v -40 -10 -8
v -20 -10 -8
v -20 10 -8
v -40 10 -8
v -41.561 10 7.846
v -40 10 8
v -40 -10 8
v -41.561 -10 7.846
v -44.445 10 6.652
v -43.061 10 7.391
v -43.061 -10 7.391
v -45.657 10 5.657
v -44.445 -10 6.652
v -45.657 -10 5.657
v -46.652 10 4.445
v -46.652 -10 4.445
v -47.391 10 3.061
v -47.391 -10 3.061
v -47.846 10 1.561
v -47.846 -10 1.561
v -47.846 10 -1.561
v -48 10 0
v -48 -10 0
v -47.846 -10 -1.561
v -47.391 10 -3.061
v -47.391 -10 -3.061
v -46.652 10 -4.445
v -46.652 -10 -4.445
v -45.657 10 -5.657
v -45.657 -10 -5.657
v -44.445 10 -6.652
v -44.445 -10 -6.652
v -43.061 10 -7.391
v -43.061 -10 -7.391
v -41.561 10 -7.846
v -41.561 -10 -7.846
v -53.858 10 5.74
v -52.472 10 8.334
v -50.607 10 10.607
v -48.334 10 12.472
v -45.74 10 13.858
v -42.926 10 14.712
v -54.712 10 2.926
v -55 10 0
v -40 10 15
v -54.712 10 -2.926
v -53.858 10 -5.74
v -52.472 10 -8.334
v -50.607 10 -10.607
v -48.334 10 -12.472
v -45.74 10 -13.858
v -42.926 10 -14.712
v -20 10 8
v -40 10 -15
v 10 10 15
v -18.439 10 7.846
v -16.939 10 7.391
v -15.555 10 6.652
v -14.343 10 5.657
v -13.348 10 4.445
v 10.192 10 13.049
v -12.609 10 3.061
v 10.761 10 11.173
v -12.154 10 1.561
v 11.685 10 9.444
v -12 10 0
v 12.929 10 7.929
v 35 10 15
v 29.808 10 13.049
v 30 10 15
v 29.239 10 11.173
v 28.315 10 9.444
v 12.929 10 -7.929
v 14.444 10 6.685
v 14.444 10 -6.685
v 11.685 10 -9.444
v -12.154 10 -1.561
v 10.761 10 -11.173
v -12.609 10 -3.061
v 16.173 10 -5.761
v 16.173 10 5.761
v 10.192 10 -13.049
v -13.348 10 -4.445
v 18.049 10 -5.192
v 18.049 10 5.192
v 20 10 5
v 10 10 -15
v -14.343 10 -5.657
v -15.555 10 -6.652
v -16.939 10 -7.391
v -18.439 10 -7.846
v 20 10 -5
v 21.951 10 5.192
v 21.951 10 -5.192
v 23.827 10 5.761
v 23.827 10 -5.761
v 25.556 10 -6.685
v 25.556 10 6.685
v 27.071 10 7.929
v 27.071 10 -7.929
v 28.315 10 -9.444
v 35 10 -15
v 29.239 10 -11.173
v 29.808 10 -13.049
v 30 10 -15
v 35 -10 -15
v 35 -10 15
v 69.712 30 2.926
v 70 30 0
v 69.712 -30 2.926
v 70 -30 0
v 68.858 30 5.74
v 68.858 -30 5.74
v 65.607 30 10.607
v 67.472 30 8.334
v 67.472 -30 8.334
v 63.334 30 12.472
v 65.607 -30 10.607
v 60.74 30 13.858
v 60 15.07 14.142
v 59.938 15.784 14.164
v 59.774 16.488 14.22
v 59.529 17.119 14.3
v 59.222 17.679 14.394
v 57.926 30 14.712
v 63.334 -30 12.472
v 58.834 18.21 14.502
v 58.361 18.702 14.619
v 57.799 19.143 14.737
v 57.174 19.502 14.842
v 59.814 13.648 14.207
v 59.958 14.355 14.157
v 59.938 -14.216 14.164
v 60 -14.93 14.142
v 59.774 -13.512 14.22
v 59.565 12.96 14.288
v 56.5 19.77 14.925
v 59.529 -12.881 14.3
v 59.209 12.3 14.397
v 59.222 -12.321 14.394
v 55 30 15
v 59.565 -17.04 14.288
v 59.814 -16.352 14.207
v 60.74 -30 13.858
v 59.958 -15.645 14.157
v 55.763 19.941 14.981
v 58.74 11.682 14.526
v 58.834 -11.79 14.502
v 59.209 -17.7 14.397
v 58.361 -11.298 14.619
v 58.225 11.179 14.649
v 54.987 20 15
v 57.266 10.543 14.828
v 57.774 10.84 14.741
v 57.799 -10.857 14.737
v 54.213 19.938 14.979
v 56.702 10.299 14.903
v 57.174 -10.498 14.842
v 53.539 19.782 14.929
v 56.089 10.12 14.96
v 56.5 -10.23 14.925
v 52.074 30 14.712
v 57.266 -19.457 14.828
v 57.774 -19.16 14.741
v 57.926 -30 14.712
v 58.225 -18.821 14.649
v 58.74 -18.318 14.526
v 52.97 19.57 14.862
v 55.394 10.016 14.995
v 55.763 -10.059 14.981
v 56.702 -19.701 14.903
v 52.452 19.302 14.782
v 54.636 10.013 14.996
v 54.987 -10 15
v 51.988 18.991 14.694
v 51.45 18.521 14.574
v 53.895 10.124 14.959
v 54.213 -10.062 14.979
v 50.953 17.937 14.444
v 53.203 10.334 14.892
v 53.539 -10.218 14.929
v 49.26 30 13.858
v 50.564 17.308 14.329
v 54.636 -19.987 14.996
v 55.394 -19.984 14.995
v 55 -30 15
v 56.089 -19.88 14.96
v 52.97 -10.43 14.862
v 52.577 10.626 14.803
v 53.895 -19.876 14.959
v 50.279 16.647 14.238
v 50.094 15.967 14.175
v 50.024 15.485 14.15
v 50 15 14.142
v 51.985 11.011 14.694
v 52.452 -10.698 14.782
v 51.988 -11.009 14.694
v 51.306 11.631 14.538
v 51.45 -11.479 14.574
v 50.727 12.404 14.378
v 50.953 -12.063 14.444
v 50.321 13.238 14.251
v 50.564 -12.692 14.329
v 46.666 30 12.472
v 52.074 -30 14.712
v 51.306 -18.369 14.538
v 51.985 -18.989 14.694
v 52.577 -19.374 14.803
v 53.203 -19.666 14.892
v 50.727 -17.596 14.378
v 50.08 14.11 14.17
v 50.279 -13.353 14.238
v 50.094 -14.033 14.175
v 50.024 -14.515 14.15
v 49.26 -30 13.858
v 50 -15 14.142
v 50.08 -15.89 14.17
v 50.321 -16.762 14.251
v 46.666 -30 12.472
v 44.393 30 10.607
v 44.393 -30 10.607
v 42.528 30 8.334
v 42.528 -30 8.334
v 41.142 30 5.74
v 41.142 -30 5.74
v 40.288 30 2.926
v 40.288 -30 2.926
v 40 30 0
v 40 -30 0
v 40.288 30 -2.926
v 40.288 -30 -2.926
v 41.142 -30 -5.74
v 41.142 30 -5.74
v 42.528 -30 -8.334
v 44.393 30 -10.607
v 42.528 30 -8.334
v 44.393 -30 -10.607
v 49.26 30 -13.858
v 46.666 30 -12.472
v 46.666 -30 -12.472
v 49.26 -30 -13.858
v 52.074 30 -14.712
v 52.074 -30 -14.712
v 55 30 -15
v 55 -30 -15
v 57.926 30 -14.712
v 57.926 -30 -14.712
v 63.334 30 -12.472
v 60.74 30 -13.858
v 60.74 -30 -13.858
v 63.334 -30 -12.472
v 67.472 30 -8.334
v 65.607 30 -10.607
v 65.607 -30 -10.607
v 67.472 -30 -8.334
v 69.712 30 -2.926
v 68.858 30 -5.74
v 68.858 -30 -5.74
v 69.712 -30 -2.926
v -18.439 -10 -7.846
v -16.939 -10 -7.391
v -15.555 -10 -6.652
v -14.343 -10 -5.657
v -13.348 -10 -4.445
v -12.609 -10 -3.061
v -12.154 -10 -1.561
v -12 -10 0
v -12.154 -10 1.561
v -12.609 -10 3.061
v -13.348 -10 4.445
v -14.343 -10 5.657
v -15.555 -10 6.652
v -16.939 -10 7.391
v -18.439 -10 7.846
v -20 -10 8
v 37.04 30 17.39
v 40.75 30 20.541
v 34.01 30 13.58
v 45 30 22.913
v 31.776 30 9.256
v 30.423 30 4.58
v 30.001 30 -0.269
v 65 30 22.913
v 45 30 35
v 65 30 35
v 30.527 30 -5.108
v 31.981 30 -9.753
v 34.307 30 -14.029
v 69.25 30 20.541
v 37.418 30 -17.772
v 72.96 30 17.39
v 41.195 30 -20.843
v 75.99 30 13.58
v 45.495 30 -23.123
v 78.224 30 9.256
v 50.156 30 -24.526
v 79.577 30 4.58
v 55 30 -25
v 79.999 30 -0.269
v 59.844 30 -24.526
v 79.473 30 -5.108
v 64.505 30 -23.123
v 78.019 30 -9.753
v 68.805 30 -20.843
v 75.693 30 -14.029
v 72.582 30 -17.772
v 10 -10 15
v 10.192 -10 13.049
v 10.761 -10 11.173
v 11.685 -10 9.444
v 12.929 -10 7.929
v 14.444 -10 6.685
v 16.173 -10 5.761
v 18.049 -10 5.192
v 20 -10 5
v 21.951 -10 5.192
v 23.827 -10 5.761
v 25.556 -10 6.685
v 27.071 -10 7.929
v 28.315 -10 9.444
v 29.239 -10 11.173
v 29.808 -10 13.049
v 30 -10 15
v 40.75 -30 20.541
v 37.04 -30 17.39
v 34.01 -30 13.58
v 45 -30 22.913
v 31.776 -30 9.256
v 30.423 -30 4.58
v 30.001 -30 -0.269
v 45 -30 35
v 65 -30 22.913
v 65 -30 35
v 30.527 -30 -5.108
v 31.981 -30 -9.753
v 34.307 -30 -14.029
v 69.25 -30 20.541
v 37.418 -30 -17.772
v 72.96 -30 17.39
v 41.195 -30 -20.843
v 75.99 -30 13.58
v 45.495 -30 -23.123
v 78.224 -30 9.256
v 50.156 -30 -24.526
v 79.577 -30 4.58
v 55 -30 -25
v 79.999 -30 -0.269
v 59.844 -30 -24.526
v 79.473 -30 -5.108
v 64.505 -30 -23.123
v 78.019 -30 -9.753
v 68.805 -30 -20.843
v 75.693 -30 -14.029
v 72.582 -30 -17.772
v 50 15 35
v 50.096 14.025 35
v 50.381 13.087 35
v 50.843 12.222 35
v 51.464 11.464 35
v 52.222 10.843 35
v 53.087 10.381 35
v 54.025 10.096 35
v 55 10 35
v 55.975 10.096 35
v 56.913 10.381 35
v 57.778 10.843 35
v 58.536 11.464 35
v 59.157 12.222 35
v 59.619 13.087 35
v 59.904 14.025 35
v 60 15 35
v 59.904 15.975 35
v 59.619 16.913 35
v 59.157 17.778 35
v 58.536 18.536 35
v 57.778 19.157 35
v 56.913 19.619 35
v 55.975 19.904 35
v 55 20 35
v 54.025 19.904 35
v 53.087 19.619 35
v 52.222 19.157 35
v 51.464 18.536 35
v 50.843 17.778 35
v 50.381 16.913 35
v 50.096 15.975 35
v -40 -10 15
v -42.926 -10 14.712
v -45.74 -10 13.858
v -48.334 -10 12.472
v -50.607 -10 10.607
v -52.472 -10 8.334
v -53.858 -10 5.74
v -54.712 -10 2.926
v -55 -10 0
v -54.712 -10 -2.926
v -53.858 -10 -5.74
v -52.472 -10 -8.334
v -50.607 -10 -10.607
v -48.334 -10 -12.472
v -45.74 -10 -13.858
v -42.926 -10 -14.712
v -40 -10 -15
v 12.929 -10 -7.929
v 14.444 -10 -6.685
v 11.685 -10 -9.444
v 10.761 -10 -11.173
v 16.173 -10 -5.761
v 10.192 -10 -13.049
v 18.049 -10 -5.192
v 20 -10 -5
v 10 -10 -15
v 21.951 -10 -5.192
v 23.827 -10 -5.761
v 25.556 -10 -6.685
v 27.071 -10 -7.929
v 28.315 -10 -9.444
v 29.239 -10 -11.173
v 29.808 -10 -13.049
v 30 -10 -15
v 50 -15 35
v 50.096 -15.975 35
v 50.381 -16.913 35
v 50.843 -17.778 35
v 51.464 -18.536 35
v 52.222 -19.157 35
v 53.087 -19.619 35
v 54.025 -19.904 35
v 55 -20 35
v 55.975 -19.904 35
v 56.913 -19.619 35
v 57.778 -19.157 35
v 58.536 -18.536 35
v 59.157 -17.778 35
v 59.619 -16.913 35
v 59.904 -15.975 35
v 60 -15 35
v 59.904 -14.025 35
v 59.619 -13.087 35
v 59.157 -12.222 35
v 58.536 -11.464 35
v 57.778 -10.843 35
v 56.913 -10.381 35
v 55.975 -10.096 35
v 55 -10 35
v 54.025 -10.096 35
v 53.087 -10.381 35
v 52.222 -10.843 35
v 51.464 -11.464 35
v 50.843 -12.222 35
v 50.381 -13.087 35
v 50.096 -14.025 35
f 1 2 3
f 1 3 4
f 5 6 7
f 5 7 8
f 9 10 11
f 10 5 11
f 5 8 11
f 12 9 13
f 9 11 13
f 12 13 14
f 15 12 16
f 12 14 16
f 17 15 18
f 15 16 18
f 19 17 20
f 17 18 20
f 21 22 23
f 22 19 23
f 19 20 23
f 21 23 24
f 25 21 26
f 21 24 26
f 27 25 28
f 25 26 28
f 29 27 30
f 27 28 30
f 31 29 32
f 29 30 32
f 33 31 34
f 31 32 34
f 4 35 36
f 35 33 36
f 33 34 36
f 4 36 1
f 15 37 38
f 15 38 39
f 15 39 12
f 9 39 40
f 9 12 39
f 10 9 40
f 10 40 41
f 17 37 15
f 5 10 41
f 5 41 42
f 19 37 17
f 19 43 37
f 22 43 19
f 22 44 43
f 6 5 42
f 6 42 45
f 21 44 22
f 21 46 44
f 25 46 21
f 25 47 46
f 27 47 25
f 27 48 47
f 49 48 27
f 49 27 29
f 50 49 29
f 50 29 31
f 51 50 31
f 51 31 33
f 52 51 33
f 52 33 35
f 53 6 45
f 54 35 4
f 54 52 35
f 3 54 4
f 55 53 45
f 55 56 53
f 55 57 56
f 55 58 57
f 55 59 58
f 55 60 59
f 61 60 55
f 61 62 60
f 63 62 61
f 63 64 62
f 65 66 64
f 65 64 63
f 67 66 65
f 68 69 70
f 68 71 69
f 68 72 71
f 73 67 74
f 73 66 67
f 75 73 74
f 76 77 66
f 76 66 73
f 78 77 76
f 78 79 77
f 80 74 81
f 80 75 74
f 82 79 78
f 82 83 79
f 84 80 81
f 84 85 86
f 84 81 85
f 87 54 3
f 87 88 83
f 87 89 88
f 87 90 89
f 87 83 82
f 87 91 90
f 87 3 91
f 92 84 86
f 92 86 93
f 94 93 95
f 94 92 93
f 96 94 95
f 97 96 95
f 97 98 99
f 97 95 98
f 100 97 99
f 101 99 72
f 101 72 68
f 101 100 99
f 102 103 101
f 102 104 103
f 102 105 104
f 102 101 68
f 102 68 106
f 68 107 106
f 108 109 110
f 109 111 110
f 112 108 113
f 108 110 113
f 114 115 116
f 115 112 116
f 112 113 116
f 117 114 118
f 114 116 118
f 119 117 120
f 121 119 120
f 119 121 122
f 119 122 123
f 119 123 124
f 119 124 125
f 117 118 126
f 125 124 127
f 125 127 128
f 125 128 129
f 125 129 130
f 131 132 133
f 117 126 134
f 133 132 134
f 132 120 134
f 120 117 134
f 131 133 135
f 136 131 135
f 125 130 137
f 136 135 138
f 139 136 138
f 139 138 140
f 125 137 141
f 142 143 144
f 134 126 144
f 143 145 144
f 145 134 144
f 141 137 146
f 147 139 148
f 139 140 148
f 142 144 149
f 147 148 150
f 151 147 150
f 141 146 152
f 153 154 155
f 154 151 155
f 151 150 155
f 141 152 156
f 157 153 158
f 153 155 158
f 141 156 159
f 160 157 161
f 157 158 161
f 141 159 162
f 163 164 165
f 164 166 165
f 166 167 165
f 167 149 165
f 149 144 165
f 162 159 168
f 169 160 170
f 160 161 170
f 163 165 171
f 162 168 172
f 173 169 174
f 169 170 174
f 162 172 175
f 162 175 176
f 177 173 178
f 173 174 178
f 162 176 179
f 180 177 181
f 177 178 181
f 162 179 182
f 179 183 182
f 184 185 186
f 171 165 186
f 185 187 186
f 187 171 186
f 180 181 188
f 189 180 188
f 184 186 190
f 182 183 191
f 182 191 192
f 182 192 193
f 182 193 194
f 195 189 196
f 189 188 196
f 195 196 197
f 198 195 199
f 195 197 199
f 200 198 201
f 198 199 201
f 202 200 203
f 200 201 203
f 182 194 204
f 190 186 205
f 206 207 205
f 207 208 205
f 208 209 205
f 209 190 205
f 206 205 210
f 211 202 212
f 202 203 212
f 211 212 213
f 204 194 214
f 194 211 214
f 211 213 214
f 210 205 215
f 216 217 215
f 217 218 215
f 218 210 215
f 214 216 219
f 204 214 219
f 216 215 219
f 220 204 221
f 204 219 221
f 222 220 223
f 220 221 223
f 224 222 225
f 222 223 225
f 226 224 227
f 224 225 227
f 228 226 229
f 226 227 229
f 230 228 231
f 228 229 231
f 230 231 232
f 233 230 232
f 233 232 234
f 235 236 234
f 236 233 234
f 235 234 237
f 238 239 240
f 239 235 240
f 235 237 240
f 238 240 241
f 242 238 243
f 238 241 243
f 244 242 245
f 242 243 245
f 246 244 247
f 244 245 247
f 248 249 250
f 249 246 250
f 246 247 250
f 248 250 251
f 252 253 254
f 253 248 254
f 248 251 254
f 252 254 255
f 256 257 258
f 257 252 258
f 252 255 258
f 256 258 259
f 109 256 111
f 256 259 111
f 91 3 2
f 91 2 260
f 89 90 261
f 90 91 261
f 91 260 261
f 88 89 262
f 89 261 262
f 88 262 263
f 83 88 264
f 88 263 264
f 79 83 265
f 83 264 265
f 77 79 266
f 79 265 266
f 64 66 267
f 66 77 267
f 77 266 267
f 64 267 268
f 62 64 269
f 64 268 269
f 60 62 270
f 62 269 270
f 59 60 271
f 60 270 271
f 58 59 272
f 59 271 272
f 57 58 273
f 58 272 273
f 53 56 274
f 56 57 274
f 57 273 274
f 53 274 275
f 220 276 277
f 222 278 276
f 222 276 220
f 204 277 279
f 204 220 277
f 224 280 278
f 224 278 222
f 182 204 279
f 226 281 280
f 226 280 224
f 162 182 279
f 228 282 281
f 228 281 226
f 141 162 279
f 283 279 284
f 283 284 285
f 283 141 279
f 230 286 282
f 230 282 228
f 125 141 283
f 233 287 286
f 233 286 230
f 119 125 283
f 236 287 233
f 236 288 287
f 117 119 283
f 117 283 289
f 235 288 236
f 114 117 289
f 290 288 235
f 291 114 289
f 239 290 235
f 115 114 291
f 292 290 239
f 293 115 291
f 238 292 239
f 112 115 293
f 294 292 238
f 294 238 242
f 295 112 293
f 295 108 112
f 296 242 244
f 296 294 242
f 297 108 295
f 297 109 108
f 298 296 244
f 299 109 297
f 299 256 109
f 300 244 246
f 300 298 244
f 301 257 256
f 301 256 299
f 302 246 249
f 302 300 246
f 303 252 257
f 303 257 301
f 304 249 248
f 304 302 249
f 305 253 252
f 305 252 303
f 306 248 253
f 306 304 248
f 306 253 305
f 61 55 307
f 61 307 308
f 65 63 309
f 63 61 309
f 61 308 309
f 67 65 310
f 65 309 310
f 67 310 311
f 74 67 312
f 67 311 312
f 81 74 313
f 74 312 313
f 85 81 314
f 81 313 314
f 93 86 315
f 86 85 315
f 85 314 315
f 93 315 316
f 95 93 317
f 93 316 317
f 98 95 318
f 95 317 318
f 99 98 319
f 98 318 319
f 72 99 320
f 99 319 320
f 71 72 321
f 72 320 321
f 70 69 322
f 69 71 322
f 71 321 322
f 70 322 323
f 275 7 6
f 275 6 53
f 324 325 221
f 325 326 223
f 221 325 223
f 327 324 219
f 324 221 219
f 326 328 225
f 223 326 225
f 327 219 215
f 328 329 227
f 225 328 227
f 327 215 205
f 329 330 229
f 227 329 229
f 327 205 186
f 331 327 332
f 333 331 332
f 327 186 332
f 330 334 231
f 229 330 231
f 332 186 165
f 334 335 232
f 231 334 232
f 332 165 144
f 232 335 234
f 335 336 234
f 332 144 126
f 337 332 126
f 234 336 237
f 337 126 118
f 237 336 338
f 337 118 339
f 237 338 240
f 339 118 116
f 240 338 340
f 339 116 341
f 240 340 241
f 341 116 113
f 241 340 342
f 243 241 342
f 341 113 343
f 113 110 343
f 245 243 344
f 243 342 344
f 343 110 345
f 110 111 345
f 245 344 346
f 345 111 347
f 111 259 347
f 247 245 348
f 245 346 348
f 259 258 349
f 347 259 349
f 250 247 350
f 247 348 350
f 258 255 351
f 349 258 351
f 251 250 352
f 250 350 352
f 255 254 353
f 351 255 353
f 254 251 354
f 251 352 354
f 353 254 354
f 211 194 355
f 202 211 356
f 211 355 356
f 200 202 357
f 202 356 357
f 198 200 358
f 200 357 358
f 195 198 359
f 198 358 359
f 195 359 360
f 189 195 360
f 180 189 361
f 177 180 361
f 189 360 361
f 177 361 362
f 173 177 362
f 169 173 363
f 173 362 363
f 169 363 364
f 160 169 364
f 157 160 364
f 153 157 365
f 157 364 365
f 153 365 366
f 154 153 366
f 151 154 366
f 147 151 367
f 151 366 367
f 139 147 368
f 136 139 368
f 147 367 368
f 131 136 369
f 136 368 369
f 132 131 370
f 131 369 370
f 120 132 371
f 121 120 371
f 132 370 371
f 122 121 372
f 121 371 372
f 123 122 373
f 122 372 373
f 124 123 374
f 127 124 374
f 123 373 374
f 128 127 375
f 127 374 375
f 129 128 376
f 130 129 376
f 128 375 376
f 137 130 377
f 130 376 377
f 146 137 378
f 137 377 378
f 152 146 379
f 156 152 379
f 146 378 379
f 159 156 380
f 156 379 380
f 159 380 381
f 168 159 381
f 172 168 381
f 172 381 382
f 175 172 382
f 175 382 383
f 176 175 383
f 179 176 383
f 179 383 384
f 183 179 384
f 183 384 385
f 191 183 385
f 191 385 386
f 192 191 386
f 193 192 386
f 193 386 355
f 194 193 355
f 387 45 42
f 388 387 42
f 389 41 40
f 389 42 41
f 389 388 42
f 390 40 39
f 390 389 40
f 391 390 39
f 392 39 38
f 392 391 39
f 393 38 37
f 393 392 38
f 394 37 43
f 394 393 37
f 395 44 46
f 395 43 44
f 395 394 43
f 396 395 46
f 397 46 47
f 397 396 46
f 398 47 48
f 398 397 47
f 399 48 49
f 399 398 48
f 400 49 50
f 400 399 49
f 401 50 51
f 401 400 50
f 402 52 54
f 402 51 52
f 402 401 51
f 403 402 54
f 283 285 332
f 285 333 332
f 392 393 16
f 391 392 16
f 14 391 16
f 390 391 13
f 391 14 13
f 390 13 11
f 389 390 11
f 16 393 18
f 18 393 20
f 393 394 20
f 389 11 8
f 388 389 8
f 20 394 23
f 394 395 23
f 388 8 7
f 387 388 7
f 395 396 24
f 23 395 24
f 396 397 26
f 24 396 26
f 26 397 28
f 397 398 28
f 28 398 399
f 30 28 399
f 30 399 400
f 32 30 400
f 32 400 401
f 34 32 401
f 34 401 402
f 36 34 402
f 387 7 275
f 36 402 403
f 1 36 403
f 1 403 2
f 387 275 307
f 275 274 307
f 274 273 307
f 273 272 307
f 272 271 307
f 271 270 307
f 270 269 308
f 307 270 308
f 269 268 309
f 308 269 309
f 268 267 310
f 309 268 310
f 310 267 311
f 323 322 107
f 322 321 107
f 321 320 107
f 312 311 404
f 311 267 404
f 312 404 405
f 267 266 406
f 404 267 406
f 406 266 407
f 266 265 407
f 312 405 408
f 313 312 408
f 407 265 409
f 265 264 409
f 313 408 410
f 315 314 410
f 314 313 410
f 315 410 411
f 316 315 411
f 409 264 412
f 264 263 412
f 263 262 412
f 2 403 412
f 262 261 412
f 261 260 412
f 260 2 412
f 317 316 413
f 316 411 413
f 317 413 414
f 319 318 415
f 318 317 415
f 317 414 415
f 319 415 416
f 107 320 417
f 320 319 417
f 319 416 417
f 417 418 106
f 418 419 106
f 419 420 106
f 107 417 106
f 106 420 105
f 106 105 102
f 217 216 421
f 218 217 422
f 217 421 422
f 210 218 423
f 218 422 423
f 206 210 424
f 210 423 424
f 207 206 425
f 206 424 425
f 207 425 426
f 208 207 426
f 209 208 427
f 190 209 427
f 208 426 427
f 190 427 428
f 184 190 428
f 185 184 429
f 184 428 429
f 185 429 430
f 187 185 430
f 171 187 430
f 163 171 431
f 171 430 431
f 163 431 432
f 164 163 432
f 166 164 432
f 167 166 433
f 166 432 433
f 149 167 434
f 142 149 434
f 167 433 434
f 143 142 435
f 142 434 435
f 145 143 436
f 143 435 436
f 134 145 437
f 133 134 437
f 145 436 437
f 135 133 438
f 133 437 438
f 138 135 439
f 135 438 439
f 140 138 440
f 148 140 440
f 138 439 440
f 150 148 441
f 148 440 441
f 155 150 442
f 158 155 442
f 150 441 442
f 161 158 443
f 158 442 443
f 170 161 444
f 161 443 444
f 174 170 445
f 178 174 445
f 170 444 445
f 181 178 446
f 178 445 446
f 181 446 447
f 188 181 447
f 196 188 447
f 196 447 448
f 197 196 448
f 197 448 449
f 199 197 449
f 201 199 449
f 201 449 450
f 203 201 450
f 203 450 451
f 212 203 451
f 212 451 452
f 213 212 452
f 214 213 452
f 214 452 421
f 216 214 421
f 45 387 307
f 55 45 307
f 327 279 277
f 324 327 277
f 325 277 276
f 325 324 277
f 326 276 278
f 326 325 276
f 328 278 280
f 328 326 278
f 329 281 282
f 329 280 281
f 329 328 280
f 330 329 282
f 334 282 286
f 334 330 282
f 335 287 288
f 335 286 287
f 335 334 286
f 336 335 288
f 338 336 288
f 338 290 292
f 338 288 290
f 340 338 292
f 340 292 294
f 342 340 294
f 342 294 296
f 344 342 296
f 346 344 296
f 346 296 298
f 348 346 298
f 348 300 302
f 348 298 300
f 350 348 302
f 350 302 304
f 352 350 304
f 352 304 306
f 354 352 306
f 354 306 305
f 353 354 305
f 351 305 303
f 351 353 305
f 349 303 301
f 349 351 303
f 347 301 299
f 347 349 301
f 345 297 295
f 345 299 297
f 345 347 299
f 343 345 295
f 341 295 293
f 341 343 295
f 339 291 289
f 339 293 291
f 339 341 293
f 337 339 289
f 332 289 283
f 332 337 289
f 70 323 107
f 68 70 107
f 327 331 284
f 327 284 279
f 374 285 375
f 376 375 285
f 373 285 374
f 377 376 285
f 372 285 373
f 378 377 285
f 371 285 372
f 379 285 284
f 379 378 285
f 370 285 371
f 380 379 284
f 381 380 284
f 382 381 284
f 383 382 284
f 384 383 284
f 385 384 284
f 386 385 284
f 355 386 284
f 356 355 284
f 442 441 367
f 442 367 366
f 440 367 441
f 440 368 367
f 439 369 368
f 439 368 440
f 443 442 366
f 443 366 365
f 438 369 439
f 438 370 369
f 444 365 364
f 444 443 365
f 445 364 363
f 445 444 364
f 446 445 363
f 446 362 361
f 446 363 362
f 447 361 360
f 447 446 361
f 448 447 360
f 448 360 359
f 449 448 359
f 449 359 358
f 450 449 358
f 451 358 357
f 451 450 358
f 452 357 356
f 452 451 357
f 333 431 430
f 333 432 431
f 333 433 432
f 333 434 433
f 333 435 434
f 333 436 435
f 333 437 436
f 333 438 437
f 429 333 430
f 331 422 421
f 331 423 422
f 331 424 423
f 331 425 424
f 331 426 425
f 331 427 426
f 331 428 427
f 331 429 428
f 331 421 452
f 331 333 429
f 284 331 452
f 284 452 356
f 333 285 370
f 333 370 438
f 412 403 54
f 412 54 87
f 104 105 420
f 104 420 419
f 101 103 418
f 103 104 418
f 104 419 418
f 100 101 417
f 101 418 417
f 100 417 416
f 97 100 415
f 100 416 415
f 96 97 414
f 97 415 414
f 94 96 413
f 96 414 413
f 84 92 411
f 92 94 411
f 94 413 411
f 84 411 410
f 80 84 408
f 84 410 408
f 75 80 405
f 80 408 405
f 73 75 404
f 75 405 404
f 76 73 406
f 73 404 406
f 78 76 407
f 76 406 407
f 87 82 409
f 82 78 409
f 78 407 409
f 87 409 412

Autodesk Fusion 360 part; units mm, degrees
sketch "Sketch1" plane through (0, 0, 0) normal (0, 1, 0) x (1, 0, 0)
  arc A0 (-40, 15) -> (-40, -15) centre (-40, 0) ccw
  line L0 (35, -15) -> (35, 15)
  line L1 (-40, -8) -> (-20, -8)
  arc A1 (-20, -8) -> (-20, 8) centre (-20, 0) ccw
  line L2 (-20, 8) -> (-40, 8)
  arc A2 (-40, 8) -> (-40, -8) centre (-40, 0) ccw
  line L3 (-40, 0) -> (-20, 0) construction
  line L4 (-40, -15) -> (10, -15)
  line L5 (30, -15) -> (35, -15)
  arc A3 (30, -15) -> (10, -15) centre (20, -15) ccw
  line L6 (-40, 15) -> (10, 15)
  line L7 (30, 15) -> (35, 15)
  arc A4 (10, 15) -> (30, 15) centre (20, 15) ccw
  dimension "d1" = 30
  dimension "d2" = 75
  dimension "d3" = 75
  dimension "d4" = 20
  dimension "d5" = 16
  dimension "d7" = 20
  dimension "d8" = 20
extrude "Extrude1" add sketch "Sketch1" along normal mid plane 20 makes body 1
sketch "Sketch2" plane through (0, 0, 0) normal (0, 1, 0) x (1, 0, 0)
  circle A0 centre (55, 0) radius 15
  line L0 (55, -35) -> (45, -35)
  line L1 (55, -35) -> (65, -35)
  line L2 (45, -35) -> (45, -22.9129)
  line L3 (65, -35) -> (65, -22.9129)
  arc A1 (65, -22.9129) -> (45, -22.9129) centre (55, 0) ccw
  dimension "d13" = 30
  dimension "d14" = 35
extrude "Extrude2" add sketch "Sketch2" along normal mid plane 60 separate body makes body 2
sketch "Sketch3" plane through (0, 0, 35) normal (0, 0, 1) x (-1, 0, 0)
  line L0 (-65, 30) -> (-65, -30)
  line L1 (-65, -30) -> (-45, -30)
  line L2 (-45, -30) -> (-45, 30)
  line L3 (-45, 30) -> (-65, 30)
  circle A0 centre (-55, -15) radius 5
  circle A1 centre (-55, 15) radius 5
  dimension "d17" = 10
  dimension "d18" = 10
extrude "Extrude3" cut sketch "Sketch3" against normal blind 25 contours A0 | A1 bodies 2
